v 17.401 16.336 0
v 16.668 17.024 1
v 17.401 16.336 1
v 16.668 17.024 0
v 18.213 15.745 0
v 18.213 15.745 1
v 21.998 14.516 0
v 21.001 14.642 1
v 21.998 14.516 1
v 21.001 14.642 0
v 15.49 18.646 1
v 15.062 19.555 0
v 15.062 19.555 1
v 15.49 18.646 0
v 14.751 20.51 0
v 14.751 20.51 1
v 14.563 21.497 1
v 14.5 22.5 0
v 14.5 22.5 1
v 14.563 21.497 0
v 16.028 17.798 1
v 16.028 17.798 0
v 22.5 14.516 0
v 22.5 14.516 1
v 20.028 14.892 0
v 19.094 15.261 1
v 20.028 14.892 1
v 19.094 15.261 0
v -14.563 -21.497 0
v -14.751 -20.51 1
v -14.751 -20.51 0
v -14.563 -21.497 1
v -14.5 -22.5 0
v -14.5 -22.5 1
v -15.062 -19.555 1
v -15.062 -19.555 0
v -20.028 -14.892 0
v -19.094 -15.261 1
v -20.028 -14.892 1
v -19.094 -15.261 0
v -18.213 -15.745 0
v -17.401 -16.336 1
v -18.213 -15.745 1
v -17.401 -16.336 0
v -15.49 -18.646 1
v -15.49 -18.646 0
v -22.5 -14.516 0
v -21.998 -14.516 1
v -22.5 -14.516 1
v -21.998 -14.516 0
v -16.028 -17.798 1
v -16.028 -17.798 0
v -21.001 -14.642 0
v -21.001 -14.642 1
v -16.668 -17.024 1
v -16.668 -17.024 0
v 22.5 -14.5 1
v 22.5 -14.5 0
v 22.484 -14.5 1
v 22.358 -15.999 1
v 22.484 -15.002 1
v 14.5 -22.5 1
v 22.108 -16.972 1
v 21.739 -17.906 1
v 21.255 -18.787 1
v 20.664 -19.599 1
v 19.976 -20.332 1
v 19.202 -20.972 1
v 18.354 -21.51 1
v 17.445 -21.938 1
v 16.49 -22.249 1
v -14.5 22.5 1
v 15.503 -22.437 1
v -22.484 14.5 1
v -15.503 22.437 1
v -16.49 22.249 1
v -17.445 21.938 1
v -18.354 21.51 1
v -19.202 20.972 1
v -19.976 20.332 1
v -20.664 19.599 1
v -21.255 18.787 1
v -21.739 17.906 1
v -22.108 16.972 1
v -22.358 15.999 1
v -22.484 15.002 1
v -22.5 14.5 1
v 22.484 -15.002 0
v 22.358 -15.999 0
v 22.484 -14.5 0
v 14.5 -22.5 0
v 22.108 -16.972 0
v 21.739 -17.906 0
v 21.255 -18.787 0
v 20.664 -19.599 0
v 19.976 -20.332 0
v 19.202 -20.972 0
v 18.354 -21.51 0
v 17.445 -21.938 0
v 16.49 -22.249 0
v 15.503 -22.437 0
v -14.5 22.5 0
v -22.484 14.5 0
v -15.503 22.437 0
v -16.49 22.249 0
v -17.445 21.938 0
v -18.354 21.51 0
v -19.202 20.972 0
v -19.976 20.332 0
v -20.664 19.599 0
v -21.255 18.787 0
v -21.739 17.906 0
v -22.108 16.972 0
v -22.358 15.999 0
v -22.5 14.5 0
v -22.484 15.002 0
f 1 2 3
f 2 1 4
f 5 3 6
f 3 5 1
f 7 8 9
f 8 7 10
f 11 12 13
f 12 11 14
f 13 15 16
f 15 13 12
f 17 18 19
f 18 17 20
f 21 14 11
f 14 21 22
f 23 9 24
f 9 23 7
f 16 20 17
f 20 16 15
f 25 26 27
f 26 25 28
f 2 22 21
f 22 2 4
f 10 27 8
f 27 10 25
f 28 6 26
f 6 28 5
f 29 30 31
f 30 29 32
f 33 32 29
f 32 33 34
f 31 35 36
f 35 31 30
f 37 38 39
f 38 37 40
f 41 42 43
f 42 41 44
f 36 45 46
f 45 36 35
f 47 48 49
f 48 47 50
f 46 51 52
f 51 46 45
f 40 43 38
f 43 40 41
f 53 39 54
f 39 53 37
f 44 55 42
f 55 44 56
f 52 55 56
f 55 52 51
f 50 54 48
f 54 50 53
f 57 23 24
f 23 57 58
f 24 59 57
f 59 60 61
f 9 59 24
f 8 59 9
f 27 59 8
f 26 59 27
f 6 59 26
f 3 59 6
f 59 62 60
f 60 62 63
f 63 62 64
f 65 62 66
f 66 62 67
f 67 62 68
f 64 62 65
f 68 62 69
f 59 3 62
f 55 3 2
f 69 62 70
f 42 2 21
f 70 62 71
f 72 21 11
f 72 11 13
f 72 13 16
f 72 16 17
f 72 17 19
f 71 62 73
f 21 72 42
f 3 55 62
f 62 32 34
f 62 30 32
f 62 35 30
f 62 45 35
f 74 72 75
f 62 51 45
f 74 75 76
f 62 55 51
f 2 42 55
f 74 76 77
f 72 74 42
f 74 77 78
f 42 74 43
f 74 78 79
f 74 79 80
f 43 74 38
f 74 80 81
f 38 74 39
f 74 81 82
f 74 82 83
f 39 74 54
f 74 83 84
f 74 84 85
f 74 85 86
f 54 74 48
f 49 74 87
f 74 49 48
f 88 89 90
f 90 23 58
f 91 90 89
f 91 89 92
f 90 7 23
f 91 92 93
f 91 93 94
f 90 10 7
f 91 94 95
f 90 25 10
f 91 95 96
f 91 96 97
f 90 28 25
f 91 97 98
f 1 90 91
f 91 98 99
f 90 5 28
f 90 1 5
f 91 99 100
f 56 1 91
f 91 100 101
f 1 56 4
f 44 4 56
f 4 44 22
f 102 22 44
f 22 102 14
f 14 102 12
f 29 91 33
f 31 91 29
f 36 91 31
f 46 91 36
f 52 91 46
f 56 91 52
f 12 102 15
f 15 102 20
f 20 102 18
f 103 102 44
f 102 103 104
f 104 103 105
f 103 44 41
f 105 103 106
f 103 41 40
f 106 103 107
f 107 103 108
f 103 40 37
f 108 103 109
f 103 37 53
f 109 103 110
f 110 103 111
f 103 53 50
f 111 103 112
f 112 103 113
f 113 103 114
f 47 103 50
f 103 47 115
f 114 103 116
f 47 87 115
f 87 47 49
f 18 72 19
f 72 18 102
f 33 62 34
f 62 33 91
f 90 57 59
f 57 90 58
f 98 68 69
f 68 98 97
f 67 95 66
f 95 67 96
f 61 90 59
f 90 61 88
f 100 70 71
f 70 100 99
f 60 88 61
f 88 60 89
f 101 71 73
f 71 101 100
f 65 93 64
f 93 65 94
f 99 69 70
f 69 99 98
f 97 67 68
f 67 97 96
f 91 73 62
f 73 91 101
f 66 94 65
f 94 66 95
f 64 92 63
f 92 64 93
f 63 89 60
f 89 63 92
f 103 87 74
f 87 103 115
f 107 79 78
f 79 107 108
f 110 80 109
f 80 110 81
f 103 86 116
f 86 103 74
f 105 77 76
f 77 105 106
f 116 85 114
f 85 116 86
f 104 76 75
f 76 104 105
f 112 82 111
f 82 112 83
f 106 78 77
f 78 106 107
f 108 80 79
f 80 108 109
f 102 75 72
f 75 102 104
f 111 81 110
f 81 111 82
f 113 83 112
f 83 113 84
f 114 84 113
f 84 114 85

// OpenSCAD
my_r = 8;
my_w = 45;

module boxshape(w, r) {
    difference() {
        translate([0,0,0.5]) cube([w, w, 1], center=true);
        union() {
            translate([w/2, w/2, 0])   cylinder(h=10, r=r, center=true, $fn=50);
            translate([-w/2, -w/2, 0]) cylinder(h=10, r=r, center=true, $fn=50);
        }
    }
}

module eckensaege(r) {
    translate([r/2, r/2, 0])
    difference() {
        translate([-r/2,-r/2,0.5])       cube([2*r, 2*r, 1], center=true);
        translate([r/2, r/2, 0])   cylinder(h=10, r=r, center=true, $fn=50);
    }
}

difference() {
    boxshape(my_w, my_r);
    translate([my_w/2, -my_w/2, -1]) rotate([0,0,90]) scale([1,1,20]) eckensaege(my_r);
    translate([-my_w/2, my_w/2, -1]) rotate([0,0,270]) scale([1,1,20]) eckensaege(my_r);
}
